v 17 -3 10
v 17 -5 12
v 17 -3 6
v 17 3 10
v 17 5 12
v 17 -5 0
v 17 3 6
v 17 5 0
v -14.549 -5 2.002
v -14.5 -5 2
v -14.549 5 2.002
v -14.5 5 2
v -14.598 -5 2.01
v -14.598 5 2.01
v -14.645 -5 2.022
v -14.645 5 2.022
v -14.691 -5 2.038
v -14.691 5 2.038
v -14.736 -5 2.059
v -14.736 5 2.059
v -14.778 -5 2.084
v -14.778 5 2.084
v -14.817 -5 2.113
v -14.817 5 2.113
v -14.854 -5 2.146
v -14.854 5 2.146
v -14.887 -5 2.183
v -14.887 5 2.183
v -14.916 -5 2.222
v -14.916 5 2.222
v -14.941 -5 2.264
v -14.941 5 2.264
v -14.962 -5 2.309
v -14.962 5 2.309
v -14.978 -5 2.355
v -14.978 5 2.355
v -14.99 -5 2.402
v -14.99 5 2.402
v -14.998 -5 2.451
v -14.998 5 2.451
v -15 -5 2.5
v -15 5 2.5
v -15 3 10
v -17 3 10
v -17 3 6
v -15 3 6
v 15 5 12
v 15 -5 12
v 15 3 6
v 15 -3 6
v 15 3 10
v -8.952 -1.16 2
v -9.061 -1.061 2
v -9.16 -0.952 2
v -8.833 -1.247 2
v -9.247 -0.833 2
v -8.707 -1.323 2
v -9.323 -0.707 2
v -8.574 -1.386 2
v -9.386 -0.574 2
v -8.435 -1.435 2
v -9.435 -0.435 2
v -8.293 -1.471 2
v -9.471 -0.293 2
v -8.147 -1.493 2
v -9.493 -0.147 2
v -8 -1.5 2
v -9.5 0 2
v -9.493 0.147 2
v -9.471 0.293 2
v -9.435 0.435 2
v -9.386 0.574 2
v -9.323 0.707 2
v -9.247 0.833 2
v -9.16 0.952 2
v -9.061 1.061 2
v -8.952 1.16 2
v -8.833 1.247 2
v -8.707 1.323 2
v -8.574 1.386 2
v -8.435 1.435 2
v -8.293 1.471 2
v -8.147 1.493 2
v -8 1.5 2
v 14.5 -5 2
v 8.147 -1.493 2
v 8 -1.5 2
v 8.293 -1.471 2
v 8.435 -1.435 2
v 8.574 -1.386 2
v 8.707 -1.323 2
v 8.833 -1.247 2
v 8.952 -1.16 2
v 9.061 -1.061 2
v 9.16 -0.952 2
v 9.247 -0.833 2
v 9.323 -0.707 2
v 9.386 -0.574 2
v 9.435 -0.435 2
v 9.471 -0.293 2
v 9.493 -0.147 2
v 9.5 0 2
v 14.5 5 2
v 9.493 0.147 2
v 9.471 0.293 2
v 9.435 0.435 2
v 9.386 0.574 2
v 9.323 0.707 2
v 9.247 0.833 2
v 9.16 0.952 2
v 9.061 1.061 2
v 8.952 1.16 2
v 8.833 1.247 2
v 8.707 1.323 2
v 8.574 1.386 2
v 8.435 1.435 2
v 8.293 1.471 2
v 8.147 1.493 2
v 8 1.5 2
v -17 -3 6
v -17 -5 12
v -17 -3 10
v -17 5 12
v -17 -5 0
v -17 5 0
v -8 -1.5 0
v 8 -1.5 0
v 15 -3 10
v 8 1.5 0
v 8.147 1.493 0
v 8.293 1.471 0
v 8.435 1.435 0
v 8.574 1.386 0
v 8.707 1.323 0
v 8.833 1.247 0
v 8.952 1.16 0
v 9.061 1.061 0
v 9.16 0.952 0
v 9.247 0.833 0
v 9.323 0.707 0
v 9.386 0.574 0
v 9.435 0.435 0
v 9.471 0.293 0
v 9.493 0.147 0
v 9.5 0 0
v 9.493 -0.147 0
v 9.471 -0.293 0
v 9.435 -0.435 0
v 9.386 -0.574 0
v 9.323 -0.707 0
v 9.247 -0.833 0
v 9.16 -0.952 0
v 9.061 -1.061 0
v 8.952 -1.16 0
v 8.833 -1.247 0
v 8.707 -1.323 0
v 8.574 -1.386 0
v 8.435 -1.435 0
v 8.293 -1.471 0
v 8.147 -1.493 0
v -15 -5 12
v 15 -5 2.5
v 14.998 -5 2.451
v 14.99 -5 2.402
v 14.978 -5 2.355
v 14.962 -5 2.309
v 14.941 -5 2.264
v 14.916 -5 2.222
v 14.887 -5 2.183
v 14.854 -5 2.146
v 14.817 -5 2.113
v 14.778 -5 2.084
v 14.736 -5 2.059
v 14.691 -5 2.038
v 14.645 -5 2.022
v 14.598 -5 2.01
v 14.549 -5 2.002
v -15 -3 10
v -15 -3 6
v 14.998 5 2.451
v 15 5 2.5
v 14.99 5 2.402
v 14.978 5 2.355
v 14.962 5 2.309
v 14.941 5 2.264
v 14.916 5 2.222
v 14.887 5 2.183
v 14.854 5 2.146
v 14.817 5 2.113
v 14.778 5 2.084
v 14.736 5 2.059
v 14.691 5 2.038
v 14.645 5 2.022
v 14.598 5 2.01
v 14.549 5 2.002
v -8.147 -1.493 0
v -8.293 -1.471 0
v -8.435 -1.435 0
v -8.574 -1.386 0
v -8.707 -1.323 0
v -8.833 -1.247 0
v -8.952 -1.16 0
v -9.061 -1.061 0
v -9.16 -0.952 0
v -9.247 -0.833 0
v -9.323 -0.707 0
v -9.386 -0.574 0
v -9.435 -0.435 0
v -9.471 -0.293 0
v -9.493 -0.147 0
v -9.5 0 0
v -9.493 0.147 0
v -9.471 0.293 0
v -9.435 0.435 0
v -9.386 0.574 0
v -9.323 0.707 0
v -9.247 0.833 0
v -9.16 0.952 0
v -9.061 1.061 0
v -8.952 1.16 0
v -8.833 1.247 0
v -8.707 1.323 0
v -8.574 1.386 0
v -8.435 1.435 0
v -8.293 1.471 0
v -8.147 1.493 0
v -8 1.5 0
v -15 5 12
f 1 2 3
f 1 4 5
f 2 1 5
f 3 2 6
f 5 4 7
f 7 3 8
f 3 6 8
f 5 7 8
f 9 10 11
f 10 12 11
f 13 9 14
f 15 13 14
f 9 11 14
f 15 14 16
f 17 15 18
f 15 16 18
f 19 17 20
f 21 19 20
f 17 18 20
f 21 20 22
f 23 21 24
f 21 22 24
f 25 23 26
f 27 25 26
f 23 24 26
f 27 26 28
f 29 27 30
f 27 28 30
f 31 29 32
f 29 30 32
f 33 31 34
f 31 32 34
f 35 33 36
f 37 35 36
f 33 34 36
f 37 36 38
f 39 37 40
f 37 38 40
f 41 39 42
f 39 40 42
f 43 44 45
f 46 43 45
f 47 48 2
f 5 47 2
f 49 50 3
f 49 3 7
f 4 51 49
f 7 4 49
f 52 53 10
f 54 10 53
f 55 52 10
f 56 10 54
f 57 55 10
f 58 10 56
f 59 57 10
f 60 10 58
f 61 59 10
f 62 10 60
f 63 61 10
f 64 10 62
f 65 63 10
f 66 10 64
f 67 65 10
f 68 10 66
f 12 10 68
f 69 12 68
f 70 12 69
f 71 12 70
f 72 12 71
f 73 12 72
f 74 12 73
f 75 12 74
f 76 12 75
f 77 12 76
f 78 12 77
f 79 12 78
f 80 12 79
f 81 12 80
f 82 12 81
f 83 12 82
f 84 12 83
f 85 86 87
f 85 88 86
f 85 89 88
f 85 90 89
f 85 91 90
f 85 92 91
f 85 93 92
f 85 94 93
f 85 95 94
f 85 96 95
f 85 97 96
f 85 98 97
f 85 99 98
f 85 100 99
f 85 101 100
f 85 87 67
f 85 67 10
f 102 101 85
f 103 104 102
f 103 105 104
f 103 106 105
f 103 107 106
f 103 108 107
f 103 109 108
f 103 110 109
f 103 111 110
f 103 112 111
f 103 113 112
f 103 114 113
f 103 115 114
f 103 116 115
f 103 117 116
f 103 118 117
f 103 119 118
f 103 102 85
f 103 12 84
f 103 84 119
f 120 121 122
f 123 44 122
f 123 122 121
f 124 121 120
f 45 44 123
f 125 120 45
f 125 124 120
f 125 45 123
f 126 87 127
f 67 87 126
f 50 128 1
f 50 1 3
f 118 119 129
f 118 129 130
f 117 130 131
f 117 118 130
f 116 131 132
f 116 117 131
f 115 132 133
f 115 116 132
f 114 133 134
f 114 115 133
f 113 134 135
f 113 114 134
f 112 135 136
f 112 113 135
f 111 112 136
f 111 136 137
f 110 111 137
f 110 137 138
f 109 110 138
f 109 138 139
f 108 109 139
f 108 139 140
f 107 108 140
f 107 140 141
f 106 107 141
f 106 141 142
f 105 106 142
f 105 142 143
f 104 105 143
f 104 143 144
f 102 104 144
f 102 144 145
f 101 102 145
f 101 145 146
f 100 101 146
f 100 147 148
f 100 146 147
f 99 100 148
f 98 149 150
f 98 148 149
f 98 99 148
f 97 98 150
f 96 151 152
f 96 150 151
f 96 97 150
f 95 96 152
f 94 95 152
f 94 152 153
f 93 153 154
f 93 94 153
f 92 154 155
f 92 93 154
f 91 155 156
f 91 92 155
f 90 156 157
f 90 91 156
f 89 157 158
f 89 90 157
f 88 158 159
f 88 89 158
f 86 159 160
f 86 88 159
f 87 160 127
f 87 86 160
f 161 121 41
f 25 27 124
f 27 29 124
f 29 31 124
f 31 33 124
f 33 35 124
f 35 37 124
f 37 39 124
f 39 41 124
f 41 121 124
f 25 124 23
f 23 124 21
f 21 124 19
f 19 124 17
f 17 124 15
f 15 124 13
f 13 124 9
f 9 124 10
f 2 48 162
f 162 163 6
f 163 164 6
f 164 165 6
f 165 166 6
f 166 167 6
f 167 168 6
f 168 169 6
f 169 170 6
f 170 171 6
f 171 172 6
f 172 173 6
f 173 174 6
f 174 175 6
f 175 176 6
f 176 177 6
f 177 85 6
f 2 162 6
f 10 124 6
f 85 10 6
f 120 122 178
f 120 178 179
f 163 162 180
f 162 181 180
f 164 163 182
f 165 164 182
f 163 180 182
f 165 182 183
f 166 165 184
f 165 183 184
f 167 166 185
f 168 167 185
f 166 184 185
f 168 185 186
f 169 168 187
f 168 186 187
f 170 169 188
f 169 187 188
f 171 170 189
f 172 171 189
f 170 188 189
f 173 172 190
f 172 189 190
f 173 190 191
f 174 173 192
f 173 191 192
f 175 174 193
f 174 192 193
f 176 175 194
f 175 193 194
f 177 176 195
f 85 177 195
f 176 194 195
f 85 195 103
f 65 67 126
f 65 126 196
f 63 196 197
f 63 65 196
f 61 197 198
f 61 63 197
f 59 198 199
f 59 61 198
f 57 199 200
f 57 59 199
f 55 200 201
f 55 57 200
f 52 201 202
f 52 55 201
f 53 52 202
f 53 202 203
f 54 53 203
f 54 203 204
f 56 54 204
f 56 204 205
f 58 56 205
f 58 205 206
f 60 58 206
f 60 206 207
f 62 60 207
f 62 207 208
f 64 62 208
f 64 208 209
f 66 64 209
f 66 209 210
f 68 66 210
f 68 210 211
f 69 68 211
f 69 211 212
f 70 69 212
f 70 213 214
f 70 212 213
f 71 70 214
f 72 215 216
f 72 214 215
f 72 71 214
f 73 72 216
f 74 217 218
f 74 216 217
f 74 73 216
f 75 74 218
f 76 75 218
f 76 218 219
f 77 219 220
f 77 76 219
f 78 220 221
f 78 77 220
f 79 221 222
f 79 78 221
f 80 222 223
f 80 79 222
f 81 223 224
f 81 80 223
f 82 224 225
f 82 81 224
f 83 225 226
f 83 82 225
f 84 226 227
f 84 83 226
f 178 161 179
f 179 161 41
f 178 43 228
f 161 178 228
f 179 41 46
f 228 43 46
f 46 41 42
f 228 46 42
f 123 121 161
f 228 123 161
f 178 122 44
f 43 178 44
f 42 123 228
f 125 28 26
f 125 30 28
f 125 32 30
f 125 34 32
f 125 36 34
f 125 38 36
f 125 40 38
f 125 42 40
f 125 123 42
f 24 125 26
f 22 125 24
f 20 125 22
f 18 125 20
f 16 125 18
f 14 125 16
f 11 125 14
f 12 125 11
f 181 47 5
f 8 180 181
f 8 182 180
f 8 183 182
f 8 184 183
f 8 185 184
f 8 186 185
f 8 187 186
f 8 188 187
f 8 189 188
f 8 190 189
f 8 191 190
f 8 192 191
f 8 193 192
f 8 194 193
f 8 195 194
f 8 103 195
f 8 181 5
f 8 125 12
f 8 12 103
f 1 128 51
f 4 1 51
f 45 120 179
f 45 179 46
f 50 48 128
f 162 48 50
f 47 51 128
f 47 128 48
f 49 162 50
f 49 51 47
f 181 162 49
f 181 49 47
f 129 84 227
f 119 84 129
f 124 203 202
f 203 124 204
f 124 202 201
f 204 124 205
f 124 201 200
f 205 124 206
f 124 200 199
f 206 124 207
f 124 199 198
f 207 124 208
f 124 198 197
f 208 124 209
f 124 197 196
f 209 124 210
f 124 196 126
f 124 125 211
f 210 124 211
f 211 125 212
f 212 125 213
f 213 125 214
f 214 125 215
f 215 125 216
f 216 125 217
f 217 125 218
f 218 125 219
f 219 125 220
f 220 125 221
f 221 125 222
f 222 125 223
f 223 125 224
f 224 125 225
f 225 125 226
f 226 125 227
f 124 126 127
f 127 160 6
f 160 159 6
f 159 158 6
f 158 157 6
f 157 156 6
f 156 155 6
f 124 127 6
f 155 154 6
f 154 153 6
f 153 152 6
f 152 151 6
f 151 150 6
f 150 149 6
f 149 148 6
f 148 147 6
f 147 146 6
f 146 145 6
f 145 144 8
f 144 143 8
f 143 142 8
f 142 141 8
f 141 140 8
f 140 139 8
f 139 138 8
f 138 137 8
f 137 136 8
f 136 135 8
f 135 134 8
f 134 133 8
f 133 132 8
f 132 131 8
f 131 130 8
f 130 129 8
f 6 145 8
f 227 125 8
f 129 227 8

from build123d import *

# Parameters (mm, degrees)
SKETCH1_W               = 34
SKETCH1_H               = 10
BOSS_EXTRUDE1_DEPTH     = 2
SKETCH2_W               = 2
SKETCH2_H               = 10
BOSS_EXTRUDE2_DEPTH     = 10
FILLET1_R               = 0.5
CUT_EXTRUDE1_DEPTH      = 37.400549446
CUT_EXTRUDE1_DEPTH_BACK = 37.400549446
SKETCH3_W               = 4
SKETCH3_H               = 6
CUT_EXTRUDE2_DEPTH      = 22.400934559
CUT_EXTRUDE2_DEPTH_BACK = 22.400934559


with BuildPart() as part:
    # Sketch1 → Boss-Extrude1 (new body)
    with BuildSketch(Plane.XY):
        Rectangle(SKETCH1_W, SKETCH1_H)
    extrude(amount=BOSS_EXTRUDE1_DEPTH)

    # Sketch2 → Boss-Extrude2 (add)
    with BuildSketch(Plane.XY.offset(2)):
        with Locations((-16, 0)):
            Rectangle(SKETCH2_W, SKETCH2_H)
        with Locations((16, 0)):
            Rectangle(SKETCH2_W, SKETCH2_H)
    extrude(amount=BOSS_EXTRUDE2_DEPTH)

    # Fillet1
    fillet1_edges = [part.edges().sort_by_distance(p)[0] for p in [
        (-15, 0, 2),
        (15, 0, 2),
    ]]
    fillet(fillet1_edges, radius=FILLET1_R)

    # Sketch3 → Cut-Extrude1 (cut, two sides: drawn at the far end of the back side and taken through both)
    with BuildSketch(Plane(origin=(17, 0, 0), x_dir=(0, 0, -1), z_dir=(1, 0, 0)).offset(-CUT_EXTRUDE1_DEPTH_BACK)):
        with Locations((-8, 0)):
            Rectangle(SKETCH3_W, SKETCH3_H)
    extrude(amount=CUT_EXTRUDE1_DEPTH + CUT_EXTRUDE1_DEPTH_BACK, mode=Mode.SUBTRACT)

    # Sketch4 → Cut-Extrude2 (cut, two sides: drawn at the far end of the back side and taken through both)
    with BuildSketch(Plane(origin=(0, 0, 0), x_dir=(-1, 0, 0), z_dir=(0, 0, -1)).offset(-CUT_EXTRUDE2_DEPTH_BACK)):
        with BuildLine():
            Line((-8, -1.5), (8, -1.5))
            ThreePointArc((8, -1.5), (9.5, 0), (8, 1.5))
            Line((8, 1.5), (-8, 1.5))
            ThreePointArc((-8, 1.5), (-9.5, 0), (-8, -1.5))
        make_face()
    extrude(amount=CUT_EXTRUDE2_DEPTH + CUT_EXTRUDE2_DEPTH_BACK, mode=Mode.SUBTRACT)


solid = part.part
